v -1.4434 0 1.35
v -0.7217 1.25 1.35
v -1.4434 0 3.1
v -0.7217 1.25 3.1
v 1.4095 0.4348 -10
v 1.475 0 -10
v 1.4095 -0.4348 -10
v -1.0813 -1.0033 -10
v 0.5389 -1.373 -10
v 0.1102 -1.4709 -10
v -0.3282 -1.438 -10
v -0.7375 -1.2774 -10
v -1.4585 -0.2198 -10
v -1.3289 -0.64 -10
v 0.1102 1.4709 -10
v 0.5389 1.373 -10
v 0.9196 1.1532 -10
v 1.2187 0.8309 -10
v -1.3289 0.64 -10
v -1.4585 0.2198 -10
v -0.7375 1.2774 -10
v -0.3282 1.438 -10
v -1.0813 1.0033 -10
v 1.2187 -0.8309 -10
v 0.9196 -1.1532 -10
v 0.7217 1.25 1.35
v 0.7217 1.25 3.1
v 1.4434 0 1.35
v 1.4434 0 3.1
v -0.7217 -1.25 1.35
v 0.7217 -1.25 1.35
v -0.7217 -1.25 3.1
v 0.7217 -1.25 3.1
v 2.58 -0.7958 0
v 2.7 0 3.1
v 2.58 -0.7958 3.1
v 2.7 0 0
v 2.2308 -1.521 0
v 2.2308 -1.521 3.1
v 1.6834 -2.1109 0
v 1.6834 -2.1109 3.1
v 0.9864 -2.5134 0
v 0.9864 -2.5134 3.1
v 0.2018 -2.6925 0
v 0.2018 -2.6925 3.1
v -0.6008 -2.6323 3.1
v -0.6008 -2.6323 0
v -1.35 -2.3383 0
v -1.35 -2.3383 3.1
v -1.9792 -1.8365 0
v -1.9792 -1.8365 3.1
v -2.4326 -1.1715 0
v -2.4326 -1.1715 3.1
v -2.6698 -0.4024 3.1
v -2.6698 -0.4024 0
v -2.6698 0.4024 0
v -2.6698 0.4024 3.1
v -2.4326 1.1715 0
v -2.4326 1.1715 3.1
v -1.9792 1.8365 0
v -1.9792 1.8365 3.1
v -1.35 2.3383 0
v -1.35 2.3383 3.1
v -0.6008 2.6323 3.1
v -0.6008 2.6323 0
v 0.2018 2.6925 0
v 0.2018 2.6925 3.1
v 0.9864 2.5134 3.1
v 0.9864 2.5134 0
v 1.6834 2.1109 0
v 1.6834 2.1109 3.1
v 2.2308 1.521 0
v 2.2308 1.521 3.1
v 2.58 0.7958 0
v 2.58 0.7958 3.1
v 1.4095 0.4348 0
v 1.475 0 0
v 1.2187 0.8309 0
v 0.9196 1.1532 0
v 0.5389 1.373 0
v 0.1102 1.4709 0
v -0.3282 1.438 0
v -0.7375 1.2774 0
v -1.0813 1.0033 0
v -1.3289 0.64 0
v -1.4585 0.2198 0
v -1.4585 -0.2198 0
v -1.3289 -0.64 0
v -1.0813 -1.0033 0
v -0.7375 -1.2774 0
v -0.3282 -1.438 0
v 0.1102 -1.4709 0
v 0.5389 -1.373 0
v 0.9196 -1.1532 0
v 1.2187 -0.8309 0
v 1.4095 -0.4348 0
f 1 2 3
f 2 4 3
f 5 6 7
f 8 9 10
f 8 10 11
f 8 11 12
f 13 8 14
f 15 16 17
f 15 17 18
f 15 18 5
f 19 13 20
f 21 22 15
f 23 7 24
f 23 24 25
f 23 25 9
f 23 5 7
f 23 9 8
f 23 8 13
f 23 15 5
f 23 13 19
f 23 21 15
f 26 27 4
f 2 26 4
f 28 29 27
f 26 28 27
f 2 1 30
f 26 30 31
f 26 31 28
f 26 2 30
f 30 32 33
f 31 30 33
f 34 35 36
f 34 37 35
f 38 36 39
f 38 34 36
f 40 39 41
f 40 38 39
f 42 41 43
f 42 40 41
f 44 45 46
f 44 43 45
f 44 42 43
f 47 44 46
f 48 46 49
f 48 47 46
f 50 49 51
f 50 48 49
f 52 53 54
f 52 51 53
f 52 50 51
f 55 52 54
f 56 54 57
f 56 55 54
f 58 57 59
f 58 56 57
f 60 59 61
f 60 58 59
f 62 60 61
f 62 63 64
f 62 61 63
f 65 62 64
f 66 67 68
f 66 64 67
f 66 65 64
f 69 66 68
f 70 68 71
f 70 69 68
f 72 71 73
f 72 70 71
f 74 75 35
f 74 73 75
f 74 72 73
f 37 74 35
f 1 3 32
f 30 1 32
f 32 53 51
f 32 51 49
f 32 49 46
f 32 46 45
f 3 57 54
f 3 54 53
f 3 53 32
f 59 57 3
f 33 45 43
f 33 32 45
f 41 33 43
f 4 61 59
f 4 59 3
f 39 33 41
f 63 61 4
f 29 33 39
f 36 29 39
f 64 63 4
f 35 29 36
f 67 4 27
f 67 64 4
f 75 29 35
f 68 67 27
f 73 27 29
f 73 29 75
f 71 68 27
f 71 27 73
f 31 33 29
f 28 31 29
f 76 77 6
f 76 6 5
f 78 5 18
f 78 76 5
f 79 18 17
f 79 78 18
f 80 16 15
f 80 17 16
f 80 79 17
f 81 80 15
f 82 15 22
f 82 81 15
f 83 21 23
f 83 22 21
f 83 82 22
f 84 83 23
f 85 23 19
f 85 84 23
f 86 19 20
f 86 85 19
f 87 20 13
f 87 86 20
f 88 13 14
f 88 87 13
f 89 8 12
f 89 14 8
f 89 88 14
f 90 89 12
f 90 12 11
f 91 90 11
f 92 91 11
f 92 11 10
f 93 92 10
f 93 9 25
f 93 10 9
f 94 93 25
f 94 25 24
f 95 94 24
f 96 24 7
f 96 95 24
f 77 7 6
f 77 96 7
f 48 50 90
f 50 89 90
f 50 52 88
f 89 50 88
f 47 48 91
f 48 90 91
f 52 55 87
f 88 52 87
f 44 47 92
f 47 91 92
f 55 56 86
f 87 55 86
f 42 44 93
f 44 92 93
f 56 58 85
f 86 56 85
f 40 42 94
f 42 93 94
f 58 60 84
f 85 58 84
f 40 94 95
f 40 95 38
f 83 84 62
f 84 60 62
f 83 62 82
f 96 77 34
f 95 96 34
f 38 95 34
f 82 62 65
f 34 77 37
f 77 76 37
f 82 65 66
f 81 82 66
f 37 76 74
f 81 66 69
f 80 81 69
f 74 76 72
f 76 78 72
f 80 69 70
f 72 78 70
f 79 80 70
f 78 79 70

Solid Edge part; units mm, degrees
sketch "Sketch1" plane through (0, 0, 0) normal (0, 0, 1) x (1, 0, 0)
  circle A0 centre (0, 0) radius 2.7
extrude "Protrusion1" add sketch "Sketch1" along normal blind 3.1
sketch "Sketch2" plane through (0, 0, 3.1) normal (0, 0, 1) x (1, 0, 0)
  line L0 (-1.4434, 0) -> (-0.7217, -1.25)
  line L1 (-0.7217, -1.25) -> (0.7217, -1.25)
  line L2 (0.7217, -1.25) -> (1.4434, 0)
  line L3 (1.4434, 0) -> (0.7217, 1.25)
  line L4 (0.7217, 1.25) -> (-0.7217, 1.25)
  line L5 (-0.7217, 1.25) -> (-1.4434, 0)
extrude "ExtrudedCutout_1" cut sketch "Sketch2" against normal blind 1.75
sketch "Sketch3" plane through (0, 0, 0) normal (0, 0, -1) x (1, 0, 0)
  circle A0 centre (0, 0) radius 1.475
extrude "ExtrudedProtrusion_2" add sketch "Sketch3" along normal blind 10
